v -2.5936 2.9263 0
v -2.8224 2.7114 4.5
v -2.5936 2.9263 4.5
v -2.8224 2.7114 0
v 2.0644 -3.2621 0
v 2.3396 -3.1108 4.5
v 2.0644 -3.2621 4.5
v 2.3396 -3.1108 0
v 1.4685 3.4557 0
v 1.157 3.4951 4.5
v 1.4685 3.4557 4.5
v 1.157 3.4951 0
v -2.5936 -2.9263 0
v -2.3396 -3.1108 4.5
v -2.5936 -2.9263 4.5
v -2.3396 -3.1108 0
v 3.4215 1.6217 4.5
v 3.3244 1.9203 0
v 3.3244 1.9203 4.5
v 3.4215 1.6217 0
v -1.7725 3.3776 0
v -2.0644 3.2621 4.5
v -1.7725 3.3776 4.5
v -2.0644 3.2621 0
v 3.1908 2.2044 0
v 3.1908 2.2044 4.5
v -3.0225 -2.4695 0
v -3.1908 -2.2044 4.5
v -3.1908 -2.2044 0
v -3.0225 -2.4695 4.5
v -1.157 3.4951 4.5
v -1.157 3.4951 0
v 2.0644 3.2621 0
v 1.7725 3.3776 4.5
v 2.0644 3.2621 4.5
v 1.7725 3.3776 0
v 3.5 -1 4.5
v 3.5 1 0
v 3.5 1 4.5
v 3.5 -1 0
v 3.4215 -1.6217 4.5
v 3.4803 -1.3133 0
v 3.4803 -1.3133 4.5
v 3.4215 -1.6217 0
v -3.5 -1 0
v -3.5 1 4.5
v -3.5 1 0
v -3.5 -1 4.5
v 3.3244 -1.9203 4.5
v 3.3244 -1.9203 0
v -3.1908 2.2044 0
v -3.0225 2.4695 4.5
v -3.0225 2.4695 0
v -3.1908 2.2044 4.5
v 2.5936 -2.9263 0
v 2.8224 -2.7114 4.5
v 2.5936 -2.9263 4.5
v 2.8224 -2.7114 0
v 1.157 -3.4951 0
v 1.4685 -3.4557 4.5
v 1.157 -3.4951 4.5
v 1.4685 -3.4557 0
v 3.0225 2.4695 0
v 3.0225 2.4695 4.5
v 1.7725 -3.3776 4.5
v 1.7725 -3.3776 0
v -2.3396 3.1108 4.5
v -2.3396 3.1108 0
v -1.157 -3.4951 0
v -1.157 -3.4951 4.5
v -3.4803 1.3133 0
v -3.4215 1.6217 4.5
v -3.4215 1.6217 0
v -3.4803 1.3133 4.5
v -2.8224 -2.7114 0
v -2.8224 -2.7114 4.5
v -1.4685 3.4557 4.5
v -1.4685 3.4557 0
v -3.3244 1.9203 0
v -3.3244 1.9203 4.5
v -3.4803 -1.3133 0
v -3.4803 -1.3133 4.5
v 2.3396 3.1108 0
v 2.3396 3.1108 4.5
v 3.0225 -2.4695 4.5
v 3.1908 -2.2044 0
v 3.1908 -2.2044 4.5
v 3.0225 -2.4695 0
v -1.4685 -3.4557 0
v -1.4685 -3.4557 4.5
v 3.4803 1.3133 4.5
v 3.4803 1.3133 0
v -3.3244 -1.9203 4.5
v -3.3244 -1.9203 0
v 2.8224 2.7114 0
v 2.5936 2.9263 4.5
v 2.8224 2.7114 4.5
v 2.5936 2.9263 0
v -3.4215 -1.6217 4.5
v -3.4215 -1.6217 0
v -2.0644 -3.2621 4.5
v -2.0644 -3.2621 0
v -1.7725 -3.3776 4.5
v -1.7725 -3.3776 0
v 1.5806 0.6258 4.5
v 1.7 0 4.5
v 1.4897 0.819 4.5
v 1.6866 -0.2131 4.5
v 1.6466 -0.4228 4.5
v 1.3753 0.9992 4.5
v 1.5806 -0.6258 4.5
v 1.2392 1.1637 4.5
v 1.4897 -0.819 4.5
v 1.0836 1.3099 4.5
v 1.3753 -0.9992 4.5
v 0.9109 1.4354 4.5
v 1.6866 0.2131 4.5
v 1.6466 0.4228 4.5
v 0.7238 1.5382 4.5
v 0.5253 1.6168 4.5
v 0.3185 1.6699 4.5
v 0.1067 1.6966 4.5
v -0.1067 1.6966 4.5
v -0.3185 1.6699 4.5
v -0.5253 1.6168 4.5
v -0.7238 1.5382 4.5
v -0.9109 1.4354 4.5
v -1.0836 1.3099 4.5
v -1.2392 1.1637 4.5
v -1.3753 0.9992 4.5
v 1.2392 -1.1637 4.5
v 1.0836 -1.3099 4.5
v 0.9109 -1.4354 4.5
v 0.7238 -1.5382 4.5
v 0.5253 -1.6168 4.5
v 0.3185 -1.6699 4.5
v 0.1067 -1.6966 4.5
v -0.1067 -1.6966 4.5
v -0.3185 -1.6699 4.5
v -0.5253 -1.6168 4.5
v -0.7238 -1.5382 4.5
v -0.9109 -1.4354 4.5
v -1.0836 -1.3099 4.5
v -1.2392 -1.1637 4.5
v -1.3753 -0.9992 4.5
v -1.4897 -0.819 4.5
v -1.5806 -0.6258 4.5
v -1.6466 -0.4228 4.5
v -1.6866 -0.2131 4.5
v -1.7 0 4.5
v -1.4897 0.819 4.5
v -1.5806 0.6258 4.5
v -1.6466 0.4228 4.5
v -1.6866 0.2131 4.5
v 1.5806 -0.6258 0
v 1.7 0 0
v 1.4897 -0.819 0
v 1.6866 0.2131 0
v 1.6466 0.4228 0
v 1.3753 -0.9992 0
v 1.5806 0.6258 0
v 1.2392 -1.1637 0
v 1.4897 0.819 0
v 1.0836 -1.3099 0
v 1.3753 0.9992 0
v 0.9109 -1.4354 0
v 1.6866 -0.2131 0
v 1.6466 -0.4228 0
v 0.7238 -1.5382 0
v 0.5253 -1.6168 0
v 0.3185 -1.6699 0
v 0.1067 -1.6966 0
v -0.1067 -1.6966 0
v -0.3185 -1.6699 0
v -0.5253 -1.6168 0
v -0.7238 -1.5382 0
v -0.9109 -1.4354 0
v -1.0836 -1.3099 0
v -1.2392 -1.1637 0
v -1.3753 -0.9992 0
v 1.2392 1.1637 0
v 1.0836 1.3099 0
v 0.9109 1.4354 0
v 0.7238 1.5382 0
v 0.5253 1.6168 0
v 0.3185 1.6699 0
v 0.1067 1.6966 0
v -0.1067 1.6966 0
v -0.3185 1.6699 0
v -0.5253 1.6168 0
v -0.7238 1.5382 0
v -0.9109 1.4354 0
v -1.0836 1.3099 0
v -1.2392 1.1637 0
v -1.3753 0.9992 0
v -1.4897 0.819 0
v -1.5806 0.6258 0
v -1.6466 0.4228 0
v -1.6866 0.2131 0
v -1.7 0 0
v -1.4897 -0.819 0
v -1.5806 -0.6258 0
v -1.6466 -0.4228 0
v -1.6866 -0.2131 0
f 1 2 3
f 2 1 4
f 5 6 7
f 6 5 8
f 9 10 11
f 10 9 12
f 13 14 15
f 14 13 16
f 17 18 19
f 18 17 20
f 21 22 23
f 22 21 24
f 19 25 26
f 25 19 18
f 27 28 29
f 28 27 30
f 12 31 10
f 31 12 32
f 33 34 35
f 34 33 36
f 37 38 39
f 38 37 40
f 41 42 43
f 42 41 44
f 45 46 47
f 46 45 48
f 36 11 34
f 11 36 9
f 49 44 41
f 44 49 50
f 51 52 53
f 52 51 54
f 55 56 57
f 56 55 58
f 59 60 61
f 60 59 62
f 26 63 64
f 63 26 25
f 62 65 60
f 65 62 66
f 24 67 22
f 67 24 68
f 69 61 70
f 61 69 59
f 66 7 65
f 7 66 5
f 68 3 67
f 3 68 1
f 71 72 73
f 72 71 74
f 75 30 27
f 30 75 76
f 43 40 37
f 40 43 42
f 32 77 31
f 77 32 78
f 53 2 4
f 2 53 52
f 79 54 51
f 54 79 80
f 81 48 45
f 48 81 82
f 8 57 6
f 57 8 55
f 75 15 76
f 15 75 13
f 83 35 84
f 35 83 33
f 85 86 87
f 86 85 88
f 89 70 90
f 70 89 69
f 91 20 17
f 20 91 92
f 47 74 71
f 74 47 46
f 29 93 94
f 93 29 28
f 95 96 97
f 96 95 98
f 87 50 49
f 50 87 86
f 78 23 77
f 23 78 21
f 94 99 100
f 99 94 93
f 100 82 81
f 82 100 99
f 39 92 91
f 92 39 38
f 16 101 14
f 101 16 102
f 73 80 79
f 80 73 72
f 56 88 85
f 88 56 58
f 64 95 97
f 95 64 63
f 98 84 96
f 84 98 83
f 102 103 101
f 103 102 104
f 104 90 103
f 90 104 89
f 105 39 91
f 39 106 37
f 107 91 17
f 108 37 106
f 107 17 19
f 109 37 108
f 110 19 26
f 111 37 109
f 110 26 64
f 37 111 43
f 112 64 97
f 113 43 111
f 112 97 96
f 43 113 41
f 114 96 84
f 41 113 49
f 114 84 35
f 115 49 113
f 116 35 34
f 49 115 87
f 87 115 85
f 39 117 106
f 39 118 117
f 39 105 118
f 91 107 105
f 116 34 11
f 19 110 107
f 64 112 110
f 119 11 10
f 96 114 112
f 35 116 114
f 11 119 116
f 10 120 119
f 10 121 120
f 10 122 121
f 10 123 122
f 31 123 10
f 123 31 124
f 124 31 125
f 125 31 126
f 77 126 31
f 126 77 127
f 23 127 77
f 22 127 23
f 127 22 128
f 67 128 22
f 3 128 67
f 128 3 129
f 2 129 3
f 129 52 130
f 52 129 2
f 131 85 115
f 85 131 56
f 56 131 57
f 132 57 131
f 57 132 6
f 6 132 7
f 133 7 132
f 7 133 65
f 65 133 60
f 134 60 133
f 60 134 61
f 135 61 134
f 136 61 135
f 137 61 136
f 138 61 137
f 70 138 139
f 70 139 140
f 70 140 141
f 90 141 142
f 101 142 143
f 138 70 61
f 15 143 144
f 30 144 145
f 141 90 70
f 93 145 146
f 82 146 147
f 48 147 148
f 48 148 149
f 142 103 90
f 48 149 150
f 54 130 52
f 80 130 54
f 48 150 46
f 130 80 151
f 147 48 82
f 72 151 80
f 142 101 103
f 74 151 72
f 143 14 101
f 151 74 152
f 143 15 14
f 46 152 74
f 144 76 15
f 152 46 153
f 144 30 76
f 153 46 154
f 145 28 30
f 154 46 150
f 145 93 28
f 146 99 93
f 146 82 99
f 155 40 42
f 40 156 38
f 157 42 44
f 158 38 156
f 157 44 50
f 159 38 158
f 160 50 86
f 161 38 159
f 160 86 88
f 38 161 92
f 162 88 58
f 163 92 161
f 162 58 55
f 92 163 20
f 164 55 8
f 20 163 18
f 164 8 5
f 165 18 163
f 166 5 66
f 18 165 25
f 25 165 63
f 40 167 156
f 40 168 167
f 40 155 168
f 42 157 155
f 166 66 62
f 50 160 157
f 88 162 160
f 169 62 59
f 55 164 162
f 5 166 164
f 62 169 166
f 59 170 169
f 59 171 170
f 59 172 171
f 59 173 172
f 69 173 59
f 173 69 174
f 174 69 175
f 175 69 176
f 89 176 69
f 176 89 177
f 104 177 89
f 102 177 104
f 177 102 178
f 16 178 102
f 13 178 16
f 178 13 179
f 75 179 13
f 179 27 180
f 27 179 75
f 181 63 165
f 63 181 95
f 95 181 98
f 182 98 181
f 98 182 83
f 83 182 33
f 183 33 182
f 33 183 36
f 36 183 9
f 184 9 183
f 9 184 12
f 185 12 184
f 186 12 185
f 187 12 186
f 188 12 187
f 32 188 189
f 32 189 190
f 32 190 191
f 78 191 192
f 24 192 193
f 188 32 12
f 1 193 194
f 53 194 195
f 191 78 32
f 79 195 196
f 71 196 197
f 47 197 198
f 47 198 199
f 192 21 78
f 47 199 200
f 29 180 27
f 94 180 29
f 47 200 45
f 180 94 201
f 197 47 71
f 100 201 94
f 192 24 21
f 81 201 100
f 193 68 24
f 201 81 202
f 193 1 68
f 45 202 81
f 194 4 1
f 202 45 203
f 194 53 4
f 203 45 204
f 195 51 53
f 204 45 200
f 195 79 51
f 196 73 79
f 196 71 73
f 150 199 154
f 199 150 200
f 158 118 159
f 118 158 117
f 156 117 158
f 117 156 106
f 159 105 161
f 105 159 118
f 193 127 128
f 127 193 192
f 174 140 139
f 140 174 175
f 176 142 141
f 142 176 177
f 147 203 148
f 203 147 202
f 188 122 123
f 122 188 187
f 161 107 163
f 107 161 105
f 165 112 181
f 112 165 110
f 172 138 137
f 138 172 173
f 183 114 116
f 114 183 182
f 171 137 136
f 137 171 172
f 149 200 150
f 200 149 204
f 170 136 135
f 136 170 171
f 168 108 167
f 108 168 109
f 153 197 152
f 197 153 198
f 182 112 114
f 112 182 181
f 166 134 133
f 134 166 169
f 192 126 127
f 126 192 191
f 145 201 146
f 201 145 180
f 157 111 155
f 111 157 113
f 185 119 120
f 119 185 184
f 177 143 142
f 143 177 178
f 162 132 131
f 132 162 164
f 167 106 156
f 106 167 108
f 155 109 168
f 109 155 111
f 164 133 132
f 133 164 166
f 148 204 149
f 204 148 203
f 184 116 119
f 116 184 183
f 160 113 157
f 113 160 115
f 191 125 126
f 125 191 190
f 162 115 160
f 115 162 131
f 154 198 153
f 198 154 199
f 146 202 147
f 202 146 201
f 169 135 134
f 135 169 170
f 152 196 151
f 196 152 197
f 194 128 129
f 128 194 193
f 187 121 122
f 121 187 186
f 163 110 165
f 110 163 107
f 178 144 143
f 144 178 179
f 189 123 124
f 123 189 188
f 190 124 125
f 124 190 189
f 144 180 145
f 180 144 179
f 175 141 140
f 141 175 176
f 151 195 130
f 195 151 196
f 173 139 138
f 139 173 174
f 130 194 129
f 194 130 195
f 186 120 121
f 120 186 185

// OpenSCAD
$fn = 50;


difference() {
	union() {
		translate(v = [0, 0, 0]) {
			rotate(a = [0, 0, 0]) {
				hull() {
					translate(v = [-1.0000000000, 1.0000000000, 0]) {
						rotate(a = [0, 0, 0]) {
							translate(v = [0, 0, 0]) {
								rotate(a = [0, 0, 0]) {
									cylinder(h = 4.5000000000, r = 2.5000000000);
								}
							}
						}
					}
					translate(v = [1.0000000000, 1.0000000000, 0]) {
						rotate(a = [0, 0, 0]) {
							translate(v = [0, 0, 0]) {
								rotate(a = [0, 0, 0]) {
									cylinder(h = 4.5000000000, r = 2.5000000000);
								}
							}
						}
					}
					translate(v = [-1.0000000000, -1.0000000000, 0]) {
						rotate(a = [0, 0, 0]) {
							translate(v = [0, 0, 0]) {
								rotate(a = [0, 0, 0]) {
									cylinder(h = 4.5000000000, r = 2.5000000000);
								}
							}
						}
					}
					translate(v = [1.0000000000, -1.0000000000, 0]) {
						rotate(a = [0, 0, 0]) {
							translate(v = [0, 0, 0]) {
								rotate(a = [0, 0, 0]) {
									cylinder(h = 4.5000000000, r = 2.5000000000);
								}
							}
						}
					}
				}
			}
		}
	}
	union() {
		translate(v = [0.0000000000, 0.0000000000, 0]) {
			rotate(a = [0, 0, 0]) {
				translate(v = [0, 0, -50]) {
					rotate(a = [0, 0, 0]) {
						cylinder(h = 100, r = 1.7000000000);
					}
				}
			}
		}
	}
}
